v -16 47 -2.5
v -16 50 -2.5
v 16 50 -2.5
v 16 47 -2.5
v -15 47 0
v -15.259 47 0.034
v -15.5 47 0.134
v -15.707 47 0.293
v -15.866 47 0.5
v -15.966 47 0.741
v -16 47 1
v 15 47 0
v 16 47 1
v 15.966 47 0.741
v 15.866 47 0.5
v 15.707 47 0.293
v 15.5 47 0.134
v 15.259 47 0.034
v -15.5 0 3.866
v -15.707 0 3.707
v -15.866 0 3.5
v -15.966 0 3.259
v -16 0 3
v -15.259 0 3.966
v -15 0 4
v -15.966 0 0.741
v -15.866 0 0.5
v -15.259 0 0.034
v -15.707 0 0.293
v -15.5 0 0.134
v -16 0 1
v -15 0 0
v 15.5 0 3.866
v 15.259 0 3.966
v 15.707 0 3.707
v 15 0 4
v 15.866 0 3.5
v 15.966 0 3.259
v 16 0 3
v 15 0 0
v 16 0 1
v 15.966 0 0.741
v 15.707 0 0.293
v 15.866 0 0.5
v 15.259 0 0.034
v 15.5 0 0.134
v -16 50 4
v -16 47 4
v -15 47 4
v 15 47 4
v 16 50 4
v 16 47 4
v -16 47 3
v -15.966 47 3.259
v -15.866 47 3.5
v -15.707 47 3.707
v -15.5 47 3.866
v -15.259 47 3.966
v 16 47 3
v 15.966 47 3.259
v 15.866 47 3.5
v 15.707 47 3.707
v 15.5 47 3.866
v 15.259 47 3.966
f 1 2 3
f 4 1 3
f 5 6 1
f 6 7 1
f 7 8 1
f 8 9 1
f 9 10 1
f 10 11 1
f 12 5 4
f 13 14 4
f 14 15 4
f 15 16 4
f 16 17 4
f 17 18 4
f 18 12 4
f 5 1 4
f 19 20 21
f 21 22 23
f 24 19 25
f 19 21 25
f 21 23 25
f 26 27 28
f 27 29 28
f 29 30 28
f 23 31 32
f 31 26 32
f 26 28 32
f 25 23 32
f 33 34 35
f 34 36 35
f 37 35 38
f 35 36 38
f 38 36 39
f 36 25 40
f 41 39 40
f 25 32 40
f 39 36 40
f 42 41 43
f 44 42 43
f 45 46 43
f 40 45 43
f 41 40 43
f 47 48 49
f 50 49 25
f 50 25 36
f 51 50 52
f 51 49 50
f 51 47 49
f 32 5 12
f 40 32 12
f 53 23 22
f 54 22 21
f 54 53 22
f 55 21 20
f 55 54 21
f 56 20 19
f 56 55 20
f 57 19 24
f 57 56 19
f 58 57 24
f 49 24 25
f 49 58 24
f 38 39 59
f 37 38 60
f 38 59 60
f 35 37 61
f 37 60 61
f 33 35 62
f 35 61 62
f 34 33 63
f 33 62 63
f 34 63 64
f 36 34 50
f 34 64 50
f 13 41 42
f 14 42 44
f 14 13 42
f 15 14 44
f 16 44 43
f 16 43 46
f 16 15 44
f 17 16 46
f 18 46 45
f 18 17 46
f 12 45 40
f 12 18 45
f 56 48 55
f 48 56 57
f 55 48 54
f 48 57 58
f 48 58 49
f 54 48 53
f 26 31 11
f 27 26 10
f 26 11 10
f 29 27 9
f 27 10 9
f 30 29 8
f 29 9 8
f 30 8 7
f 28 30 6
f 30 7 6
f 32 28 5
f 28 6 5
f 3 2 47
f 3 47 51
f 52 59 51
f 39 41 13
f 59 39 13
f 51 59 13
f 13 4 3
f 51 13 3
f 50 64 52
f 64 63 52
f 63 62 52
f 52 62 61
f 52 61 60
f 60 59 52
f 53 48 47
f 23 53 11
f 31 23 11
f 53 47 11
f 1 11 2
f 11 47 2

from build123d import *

# Parameters (mm, degrees)
SKETCH1_W      = 32
SKETCH1_H      = 50
EXTRUDE1_DEPTH = 4
FILLET1_R      = 1
SKETCH3_W      = 32
SKETCH3_H      = 6.5
EXTRUDE3_DEPTH = 3


with BuildPart() as part:
    # Sketch1 → Extrude1 (new body)
    with BuildSketch(Plane.XY):
        with Locations((0, 25)):
            Rectangle(SKETCH1_W, SKETCH1_H)
    extrude(amount=EXTRUDE1_DEPTH)

    # Fillet1
    fillet1_edges = [part.edges().sort_by_distance(p)[0] for p in [
        (16, 25, 4),
        (-16, 25, 4),
        (16, 25, 0),
        (-16, 25, 0),
    ]]
    fillet(fillet1_edges, radius=FILLET1_R)

    # Sketch3 → Extrude3 (add)
    with BuildSketch(Plane(origin=(0, 50, 0), x_dir=(1, 0, 0), z_dir=(0, 1, 0))):
        with Locations((0, -0.75)):
            Rectangle(SKETCH3_W, SKETCH3_H)
    extrude(amount=-EXTRUDE3_DEPTH)


solid = part.part
